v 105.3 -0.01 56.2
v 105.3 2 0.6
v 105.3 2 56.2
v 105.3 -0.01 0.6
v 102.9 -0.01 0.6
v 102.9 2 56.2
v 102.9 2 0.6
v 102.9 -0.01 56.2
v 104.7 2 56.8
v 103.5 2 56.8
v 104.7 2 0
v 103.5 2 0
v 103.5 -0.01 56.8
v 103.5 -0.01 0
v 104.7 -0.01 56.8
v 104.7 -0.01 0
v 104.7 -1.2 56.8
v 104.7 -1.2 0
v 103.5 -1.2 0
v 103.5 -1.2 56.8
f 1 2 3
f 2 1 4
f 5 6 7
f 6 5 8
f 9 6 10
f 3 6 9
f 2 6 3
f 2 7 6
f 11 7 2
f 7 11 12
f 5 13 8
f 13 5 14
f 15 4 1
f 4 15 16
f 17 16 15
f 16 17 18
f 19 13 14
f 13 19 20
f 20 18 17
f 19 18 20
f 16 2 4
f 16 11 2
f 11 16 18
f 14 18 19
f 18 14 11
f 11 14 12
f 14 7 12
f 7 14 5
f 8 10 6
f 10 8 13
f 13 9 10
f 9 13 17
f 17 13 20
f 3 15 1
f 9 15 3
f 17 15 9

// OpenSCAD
include <../lib/spool-drybox-lib.scad>;
$fn = 40;
panel_gasket("lid");
